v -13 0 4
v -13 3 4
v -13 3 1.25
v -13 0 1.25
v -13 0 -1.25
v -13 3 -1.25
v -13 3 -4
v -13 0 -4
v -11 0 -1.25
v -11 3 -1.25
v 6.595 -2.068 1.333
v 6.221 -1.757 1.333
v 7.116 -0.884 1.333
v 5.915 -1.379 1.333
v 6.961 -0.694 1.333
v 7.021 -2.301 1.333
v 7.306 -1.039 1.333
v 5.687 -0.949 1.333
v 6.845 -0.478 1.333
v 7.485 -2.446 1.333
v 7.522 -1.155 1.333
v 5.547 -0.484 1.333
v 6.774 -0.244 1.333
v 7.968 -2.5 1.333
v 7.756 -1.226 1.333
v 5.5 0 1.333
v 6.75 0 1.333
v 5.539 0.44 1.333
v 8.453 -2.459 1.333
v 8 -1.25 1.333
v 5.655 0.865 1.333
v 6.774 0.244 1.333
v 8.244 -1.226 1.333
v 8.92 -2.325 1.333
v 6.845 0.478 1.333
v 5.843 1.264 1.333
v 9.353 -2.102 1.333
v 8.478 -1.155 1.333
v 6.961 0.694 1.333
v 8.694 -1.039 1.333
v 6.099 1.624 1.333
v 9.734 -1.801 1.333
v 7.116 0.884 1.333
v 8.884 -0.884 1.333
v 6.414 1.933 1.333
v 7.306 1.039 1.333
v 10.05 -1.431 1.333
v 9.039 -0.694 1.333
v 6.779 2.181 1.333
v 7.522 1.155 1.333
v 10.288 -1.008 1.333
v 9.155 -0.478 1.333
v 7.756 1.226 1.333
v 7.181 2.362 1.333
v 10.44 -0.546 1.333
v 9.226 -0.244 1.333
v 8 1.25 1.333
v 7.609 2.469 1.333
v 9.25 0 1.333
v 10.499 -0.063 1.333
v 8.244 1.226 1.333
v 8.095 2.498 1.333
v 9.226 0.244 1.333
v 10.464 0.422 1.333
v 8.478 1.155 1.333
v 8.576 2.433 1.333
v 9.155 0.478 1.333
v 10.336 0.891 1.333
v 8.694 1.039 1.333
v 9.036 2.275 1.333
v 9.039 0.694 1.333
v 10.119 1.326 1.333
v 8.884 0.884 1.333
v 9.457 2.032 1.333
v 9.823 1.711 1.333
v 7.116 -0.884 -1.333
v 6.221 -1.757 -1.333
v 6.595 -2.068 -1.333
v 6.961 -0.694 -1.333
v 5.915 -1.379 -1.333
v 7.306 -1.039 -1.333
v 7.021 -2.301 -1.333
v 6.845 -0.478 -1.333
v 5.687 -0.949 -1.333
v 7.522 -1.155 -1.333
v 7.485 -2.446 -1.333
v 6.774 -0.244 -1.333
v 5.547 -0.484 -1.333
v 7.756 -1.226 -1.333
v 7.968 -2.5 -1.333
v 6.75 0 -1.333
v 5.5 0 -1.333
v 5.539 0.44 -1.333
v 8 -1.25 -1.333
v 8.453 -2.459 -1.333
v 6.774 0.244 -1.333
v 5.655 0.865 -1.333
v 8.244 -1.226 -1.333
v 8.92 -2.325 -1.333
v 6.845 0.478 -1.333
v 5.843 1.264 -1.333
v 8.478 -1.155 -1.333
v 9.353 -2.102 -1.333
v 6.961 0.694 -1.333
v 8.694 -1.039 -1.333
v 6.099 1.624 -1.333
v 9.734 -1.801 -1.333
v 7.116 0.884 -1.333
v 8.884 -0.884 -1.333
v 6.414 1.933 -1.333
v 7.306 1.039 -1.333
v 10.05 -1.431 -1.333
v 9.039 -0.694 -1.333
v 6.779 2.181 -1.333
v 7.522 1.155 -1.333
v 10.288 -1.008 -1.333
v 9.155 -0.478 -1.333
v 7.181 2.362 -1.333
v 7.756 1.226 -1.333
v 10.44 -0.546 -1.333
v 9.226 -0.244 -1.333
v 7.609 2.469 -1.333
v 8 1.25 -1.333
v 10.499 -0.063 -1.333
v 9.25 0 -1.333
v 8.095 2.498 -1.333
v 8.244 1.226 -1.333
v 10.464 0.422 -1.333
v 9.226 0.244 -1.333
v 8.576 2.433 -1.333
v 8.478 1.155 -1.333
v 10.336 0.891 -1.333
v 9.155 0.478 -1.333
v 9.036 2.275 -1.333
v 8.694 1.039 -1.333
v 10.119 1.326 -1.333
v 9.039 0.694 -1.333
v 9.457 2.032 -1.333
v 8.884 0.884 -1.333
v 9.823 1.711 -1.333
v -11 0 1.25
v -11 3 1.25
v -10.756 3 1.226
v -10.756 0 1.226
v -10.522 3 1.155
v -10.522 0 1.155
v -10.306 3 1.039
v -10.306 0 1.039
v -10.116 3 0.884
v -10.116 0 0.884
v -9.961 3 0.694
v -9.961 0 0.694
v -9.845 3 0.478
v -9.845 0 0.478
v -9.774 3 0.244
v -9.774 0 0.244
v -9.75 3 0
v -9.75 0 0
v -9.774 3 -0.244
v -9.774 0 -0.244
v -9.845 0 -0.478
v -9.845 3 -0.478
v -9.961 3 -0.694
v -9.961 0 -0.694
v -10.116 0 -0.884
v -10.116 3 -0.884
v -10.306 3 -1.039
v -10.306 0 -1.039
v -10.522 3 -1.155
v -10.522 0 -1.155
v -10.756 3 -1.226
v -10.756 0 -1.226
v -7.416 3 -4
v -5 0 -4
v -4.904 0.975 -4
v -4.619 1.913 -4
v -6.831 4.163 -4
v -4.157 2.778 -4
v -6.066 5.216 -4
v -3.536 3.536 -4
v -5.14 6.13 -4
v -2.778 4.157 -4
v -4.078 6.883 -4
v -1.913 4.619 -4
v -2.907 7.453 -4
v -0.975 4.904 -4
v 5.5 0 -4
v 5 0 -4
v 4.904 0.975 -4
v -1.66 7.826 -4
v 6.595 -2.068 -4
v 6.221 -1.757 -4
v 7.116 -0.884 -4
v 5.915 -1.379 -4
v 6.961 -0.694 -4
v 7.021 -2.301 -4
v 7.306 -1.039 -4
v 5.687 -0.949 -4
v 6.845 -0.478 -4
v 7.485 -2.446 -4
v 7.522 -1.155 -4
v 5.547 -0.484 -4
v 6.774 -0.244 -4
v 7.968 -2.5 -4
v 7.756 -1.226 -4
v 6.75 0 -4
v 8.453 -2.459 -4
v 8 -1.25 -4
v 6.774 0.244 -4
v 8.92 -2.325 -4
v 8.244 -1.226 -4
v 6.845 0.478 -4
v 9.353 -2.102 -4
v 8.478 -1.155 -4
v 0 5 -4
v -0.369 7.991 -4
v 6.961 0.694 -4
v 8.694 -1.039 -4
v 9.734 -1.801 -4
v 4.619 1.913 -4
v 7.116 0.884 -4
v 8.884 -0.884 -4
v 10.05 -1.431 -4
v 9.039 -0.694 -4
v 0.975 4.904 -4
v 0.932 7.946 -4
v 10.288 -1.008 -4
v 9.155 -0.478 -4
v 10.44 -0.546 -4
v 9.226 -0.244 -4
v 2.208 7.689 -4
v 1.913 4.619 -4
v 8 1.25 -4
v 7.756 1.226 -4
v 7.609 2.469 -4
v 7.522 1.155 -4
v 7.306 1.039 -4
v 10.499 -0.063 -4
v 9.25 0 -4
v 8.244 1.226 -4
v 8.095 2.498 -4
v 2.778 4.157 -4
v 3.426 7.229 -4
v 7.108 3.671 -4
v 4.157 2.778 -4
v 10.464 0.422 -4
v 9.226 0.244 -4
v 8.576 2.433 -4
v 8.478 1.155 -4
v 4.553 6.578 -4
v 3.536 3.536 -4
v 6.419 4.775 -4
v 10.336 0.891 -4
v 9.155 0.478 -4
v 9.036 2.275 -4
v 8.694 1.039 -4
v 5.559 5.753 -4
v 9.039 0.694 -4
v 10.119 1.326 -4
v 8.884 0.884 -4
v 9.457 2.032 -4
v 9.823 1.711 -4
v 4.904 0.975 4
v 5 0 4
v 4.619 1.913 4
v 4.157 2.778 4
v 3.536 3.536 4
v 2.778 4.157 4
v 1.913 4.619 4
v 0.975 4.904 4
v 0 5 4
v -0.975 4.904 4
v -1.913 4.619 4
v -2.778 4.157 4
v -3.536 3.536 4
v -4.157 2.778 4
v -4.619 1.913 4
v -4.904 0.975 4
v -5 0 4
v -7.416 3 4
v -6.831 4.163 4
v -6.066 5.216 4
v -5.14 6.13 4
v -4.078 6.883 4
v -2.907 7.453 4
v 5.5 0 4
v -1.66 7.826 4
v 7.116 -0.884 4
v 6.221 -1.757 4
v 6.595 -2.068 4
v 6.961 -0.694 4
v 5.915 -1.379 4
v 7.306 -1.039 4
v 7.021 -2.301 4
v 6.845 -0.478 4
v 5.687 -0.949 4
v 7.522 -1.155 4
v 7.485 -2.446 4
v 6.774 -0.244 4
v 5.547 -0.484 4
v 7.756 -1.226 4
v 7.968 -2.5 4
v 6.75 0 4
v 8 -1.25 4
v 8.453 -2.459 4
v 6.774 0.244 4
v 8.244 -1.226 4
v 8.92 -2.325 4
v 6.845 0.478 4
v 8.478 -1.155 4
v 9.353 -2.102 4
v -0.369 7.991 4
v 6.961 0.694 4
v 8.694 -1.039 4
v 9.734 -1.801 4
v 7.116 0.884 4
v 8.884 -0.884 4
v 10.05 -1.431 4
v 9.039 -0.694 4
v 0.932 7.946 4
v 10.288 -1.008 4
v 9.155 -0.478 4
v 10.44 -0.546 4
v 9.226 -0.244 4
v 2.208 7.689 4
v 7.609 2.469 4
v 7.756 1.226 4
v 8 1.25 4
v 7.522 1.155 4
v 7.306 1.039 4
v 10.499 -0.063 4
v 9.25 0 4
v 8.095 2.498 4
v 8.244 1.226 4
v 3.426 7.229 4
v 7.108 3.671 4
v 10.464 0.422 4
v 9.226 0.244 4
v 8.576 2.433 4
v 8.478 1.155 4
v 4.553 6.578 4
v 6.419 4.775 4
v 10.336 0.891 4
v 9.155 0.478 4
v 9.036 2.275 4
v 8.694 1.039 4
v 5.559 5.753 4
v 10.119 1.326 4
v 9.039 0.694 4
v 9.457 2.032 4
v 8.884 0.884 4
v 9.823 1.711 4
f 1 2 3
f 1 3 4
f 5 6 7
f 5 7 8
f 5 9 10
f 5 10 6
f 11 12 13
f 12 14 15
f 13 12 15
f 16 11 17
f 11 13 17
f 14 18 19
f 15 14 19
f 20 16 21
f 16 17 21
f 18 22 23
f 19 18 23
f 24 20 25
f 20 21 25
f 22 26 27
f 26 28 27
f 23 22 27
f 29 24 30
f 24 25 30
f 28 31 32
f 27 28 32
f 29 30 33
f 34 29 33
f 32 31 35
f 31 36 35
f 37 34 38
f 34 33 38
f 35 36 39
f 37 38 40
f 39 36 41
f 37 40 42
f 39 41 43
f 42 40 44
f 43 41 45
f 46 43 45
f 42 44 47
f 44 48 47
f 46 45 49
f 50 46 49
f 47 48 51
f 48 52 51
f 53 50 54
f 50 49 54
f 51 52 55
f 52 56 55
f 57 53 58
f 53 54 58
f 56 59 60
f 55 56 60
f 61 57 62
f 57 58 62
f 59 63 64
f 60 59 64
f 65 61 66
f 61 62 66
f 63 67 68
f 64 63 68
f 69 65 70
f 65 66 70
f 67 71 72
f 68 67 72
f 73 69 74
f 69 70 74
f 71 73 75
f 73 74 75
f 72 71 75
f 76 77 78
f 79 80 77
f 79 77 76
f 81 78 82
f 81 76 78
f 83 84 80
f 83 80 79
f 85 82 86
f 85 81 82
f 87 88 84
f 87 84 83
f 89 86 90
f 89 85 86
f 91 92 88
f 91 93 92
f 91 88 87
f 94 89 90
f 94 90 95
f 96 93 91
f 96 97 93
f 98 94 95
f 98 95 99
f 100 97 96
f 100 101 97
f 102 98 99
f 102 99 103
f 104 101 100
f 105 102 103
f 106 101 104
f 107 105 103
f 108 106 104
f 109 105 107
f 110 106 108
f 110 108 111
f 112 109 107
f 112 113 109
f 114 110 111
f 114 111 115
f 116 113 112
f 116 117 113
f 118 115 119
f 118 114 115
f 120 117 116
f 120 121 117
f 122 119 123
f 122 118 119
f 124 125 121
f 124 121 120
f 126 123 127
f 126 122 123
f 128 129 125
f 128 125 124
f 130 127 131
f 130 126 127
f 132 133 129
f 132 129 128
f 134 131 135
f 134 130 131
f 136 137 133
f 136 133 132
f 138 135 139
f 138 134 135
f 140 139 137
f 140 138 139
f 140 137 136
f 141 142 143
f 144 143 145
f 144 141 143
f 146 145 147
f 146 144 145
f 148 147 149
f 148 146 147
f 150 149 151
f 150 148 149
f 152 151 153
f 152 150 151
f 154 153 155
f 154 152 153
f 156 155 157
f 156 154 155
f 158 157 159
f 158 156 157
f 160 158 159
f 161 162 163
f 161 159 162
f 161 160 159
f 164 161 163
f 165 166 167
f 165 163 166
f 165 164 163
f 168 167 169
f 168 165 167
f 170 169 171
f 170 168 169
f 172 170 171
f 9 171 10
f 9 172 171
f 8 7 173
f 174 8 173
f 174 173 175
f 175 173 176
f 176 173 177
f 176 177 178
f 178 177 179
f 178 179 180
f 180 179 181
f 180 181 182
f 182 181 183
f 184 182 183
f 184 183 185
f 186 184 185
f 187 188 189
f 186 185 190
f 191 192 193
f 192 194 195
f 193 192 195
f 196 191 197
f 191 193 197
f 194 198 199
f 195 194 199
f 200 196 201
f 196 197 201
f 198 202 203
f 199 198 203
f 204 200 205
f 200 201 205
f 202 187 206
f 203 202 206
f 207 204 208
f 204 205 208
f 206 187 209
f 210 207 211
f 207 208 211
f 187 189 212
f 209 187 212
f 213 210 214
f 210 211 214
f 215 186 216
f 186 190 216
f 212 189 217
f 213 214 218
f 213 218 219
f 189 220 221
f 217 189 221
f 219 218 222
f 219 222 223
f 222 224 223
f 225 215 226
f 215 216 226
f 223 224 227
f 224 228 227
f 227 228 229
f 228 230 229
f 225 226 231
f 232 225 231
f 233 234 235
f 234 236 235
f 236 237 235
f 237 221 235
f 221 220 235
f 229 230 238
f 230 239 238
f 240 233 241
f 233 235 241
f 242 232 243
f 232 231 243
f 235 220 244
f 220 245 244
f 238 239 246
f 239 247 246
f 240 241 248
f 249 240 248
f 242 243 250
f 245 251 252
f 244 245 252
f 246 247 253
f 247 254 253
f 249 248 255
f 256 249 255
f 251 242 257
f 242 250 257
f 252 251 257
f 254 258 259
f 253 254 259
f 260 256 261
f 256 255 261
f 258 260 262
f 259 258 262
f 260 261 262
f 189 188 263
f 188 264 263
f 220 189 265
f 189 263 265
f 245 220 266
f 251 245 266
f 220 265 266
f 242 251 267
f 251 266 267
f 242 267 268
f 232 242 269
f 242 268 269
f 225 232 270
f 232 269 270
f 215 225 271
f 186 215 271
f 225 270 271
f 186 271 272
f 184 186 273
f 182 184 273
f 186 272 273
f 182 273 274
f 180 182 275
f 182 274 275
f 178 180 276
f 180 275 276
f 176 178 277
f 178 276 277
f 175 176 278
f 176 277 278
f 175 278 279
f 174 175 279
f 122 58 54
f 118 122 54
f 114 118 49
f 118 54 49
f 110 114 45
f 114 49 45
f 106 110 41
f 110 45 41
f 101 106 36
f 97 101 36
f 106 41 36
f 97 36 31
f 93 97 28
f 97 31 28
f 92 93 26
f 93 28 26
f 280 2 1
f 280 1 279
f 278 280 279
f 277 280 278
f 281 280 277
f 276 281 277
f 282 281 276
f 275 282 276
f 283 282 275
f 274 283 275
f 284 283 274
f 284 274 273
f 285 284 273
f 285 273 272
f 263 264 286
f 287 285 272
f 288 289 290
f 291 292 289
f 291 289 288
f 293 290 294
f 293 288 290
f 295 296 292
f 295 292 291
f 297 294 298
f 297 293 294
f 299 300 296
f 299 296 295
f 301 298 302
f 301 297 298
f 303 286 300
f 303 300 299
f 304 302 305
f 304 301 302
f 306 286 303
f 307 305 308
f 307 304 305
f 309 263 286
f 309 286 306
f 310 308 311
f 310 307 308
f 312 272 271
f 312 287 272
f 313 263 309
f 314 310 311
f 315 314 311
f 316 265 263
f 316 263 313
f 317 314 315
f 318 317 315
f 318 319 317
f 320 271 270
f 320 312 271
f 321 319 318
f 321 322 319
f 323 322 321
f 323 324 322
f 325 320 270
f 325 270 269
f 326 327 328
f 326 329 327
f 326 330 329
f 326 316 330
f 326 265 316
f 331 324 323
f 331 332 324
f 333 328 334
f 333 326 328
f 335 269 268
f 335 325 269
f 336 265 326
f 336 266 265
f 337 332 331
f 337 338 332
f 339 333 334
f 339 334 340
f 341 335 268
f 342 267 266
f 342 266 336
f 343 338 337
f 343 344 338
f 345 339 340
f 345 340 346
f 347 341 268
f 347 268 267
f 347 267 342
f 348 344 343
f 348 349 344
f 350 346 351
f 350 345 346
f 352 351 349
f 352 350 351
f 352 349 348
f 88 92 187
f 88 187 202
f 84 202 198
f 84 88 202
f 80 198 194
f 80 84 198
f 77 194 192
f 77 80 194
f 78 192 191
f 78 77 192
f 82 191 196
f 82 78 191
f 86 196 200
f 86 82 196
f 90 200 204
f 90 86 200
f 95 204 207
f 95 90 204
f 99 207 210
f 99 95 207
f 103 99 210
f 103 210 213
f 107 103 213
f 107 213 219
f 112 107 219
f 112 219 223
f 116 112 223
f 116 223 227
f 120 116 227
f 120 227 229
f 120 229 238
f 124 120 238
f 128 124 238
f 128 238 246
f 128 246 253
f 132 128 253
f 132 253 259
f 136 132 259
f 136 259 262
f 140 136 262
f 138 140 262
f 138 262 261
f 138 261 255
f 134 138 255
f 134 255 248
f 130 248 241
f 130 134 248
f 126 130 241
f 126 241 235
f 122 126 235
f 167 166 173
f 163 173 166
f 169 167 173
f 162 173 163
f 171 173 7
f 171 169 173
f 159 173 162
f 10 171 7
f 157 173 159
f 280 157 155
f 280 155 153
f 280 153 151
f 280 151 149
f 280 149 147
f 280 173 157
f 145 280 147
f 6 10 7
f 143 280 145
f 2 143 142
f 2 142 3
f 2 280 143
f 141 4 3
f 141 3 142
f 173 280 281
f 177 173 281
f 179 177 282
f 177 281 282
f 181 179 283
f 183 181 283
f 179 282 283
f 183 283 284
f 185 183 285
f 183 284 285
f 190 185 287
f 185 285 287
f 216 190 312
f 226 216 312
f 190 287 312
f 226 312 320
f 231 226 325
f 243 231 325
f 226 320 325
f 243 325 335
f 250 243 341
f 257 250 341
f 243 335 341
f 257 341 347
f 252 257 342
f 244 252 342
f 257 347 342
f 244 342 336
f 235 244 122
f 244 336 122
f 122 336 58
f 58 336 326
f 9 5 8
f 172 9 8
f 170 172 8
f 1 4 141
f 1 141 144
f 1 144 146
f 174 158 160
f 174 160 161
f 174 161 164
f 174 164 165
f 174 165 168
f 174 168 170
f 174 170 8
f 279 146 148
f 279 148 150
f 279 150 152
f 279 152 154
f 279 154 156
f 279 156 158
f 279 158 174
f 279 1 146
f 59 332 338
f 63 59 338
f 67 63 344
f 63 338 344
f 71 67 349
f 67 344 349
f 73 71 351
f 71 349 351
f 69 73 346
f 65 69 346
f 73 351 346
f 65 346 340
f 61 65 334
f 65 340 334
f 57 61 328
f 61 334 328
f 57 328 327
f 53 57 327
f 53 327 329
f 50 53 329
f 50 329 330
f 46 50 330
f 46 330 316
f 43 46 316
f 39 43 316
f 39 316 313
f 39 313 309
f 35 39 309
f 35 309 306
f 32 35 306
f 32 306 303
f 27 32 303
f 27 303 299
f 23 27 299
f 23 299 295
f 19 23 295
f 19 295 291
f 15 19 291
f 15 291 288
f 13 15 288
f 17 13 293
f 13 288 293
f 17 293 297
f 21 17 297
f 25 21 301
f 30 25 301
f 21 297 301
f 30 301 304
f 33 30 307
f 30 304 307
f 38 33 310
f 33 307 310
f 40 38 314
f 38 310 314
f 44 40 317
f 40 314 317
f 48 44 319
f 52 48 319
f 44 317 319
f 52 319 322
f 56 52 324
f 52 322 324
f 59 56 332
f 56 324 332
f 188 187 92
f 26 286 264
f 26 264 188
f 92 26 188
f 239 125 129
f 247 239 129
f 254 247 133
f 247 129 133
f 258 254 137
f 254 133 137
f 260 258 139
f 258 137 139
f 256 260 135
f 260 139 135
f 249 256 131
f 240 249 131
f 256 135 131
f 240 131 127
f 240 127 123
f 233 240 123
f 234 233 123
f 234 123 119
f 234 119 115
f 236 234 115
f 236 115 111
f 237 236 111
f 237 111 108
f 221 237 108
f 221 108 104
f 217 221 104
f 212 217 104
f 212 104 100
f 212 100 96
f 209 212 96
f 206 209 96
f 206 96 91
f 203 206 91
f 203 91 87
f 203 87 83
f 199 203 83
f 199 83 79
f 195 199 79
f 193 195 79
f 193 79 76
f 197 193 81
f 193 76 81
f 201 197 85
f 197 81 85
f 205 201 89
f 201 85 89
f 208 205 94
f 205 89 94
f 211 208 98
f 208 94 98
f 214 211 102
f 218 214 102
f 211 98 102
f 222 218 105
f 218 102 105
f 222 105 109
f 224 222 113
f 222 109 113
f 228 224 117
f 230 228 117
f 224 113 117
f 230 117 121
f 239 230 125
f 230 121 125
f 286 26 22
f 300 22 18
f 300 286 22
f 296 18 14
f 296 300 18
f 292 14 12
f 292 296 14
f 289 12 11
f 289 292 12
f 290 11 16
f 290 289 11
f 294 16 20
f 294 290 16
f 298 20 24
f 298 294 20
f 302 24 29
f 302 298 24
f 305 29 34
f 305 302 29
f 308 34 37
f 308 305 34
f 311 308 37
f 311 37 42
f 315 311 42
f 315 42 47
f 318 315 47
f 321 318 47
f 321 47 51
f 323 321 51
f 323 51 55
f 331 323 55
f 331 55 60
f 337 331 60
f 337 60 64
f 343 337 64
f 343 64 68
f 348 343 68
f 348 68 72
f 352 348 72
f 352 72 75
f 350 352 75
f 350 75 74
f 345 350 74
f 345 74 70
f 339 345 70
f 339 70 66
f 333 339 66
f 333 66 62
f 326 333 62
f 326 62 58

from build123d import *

# Parameters (mm, degrees)
BOSS_EXTRUDE1_DEPTH     = 4
SKETCH2_R               = 2.5
BOSS_EXTRUDE3_DEPTH     = 4
SKETCH3_R               = 1.25
CUT_EXTRUDE1_DEPTH      = 8
SKETCH4_R               = 2.5
CUT_EXTRUDE2_DEPTH      = 1.333333333
CUT_EXTRUDE3_DEPTH      = 15.671400751
CUT_EXTRUDE3_DEPTH_BACK = 3


with BuildPart() as part:
    # Sketch1 → Boss-Extrude1 (new, symmetric)
    with BuildSketch(Plane.XY):
        with BuildLine():
            ThreePointArc((-8, 0), (0, 8), (8, 0))
            Line((8, 0), (5, 0))
            ThreePointArc((5, 0), (0, 5), (-5, 0))
            Line((-5, 0), (-8, 0))
        make_face()
        with BuildLine():
            Line((-13, 0), (-8, 0))
            ThreePointArc((-8, 0), (-7.85269342, 1.5281381), (-7.416198487, 3))
            Line((-7.416198487, 3), (-13, 3))
            Line((-13, 3), (-13, 0))
        make_face()
    extrude(amount=BOSS_EXTRUDE1_DEPTH, both=True)

    # Sketch2 → Boss-Extrude3 (add, symmetric)
    with BuildSketch(Plane.XY):
        with Locations((8, 0)):
            Circle(SKETCH2_R)
    extrude(amount=BOSS_EXTRUDE3_DEPTH, both=True)

    # Sketch3 → Cut-Extrude1 (cut)
    with BuildSketch(Plane.XY.offset(4)):
        with Locations((8, 0)):
            Circle(SKETCH3_R)
    extrude(amount=-CUT_EXTRUDE1_DEPTH, mode=Mode.SUBTRACT)

    # Sketch4 → Cut-Extrude2 (cut, symmetric)
    with BuildSketch(Plane.XY):
        with Locations((8, 0)):
            Circle(SKETCH4_R)
    extrude(amount=CUT_EXTRUDE2_DEPTH, both=True, mode=Mode.SUBTRACT)

    # Sketch5 → Cut-Extrude3 (cut, two sides: drawn at the far end of the back side and taken through both)
    with BuildSketch(Plane(origin=(0, 3, 0), x_dir=(1, 0, 0), z_dir=(0, 1, 0)).offset(-CUT_EXTRUDE3_DEPTH_BACK)):
        with BuildLine():
            Line((-11, 1.25), (-13, 1.25))
            Line((-13, 1.25), (-13, -1.25))
            Line((-13, -1.25), (-11, -1.25))
            ThreePointArc((-11, -1.25), (-9.75, 0), (-11, 1.25))
        make_face()
    extrude(amount=CUT_EXTRUDE3_DEPTH + CUT_EXTRUDE3_DEPTH_BACK, mode=Mode.SUBTRACT)


solid = part.part
